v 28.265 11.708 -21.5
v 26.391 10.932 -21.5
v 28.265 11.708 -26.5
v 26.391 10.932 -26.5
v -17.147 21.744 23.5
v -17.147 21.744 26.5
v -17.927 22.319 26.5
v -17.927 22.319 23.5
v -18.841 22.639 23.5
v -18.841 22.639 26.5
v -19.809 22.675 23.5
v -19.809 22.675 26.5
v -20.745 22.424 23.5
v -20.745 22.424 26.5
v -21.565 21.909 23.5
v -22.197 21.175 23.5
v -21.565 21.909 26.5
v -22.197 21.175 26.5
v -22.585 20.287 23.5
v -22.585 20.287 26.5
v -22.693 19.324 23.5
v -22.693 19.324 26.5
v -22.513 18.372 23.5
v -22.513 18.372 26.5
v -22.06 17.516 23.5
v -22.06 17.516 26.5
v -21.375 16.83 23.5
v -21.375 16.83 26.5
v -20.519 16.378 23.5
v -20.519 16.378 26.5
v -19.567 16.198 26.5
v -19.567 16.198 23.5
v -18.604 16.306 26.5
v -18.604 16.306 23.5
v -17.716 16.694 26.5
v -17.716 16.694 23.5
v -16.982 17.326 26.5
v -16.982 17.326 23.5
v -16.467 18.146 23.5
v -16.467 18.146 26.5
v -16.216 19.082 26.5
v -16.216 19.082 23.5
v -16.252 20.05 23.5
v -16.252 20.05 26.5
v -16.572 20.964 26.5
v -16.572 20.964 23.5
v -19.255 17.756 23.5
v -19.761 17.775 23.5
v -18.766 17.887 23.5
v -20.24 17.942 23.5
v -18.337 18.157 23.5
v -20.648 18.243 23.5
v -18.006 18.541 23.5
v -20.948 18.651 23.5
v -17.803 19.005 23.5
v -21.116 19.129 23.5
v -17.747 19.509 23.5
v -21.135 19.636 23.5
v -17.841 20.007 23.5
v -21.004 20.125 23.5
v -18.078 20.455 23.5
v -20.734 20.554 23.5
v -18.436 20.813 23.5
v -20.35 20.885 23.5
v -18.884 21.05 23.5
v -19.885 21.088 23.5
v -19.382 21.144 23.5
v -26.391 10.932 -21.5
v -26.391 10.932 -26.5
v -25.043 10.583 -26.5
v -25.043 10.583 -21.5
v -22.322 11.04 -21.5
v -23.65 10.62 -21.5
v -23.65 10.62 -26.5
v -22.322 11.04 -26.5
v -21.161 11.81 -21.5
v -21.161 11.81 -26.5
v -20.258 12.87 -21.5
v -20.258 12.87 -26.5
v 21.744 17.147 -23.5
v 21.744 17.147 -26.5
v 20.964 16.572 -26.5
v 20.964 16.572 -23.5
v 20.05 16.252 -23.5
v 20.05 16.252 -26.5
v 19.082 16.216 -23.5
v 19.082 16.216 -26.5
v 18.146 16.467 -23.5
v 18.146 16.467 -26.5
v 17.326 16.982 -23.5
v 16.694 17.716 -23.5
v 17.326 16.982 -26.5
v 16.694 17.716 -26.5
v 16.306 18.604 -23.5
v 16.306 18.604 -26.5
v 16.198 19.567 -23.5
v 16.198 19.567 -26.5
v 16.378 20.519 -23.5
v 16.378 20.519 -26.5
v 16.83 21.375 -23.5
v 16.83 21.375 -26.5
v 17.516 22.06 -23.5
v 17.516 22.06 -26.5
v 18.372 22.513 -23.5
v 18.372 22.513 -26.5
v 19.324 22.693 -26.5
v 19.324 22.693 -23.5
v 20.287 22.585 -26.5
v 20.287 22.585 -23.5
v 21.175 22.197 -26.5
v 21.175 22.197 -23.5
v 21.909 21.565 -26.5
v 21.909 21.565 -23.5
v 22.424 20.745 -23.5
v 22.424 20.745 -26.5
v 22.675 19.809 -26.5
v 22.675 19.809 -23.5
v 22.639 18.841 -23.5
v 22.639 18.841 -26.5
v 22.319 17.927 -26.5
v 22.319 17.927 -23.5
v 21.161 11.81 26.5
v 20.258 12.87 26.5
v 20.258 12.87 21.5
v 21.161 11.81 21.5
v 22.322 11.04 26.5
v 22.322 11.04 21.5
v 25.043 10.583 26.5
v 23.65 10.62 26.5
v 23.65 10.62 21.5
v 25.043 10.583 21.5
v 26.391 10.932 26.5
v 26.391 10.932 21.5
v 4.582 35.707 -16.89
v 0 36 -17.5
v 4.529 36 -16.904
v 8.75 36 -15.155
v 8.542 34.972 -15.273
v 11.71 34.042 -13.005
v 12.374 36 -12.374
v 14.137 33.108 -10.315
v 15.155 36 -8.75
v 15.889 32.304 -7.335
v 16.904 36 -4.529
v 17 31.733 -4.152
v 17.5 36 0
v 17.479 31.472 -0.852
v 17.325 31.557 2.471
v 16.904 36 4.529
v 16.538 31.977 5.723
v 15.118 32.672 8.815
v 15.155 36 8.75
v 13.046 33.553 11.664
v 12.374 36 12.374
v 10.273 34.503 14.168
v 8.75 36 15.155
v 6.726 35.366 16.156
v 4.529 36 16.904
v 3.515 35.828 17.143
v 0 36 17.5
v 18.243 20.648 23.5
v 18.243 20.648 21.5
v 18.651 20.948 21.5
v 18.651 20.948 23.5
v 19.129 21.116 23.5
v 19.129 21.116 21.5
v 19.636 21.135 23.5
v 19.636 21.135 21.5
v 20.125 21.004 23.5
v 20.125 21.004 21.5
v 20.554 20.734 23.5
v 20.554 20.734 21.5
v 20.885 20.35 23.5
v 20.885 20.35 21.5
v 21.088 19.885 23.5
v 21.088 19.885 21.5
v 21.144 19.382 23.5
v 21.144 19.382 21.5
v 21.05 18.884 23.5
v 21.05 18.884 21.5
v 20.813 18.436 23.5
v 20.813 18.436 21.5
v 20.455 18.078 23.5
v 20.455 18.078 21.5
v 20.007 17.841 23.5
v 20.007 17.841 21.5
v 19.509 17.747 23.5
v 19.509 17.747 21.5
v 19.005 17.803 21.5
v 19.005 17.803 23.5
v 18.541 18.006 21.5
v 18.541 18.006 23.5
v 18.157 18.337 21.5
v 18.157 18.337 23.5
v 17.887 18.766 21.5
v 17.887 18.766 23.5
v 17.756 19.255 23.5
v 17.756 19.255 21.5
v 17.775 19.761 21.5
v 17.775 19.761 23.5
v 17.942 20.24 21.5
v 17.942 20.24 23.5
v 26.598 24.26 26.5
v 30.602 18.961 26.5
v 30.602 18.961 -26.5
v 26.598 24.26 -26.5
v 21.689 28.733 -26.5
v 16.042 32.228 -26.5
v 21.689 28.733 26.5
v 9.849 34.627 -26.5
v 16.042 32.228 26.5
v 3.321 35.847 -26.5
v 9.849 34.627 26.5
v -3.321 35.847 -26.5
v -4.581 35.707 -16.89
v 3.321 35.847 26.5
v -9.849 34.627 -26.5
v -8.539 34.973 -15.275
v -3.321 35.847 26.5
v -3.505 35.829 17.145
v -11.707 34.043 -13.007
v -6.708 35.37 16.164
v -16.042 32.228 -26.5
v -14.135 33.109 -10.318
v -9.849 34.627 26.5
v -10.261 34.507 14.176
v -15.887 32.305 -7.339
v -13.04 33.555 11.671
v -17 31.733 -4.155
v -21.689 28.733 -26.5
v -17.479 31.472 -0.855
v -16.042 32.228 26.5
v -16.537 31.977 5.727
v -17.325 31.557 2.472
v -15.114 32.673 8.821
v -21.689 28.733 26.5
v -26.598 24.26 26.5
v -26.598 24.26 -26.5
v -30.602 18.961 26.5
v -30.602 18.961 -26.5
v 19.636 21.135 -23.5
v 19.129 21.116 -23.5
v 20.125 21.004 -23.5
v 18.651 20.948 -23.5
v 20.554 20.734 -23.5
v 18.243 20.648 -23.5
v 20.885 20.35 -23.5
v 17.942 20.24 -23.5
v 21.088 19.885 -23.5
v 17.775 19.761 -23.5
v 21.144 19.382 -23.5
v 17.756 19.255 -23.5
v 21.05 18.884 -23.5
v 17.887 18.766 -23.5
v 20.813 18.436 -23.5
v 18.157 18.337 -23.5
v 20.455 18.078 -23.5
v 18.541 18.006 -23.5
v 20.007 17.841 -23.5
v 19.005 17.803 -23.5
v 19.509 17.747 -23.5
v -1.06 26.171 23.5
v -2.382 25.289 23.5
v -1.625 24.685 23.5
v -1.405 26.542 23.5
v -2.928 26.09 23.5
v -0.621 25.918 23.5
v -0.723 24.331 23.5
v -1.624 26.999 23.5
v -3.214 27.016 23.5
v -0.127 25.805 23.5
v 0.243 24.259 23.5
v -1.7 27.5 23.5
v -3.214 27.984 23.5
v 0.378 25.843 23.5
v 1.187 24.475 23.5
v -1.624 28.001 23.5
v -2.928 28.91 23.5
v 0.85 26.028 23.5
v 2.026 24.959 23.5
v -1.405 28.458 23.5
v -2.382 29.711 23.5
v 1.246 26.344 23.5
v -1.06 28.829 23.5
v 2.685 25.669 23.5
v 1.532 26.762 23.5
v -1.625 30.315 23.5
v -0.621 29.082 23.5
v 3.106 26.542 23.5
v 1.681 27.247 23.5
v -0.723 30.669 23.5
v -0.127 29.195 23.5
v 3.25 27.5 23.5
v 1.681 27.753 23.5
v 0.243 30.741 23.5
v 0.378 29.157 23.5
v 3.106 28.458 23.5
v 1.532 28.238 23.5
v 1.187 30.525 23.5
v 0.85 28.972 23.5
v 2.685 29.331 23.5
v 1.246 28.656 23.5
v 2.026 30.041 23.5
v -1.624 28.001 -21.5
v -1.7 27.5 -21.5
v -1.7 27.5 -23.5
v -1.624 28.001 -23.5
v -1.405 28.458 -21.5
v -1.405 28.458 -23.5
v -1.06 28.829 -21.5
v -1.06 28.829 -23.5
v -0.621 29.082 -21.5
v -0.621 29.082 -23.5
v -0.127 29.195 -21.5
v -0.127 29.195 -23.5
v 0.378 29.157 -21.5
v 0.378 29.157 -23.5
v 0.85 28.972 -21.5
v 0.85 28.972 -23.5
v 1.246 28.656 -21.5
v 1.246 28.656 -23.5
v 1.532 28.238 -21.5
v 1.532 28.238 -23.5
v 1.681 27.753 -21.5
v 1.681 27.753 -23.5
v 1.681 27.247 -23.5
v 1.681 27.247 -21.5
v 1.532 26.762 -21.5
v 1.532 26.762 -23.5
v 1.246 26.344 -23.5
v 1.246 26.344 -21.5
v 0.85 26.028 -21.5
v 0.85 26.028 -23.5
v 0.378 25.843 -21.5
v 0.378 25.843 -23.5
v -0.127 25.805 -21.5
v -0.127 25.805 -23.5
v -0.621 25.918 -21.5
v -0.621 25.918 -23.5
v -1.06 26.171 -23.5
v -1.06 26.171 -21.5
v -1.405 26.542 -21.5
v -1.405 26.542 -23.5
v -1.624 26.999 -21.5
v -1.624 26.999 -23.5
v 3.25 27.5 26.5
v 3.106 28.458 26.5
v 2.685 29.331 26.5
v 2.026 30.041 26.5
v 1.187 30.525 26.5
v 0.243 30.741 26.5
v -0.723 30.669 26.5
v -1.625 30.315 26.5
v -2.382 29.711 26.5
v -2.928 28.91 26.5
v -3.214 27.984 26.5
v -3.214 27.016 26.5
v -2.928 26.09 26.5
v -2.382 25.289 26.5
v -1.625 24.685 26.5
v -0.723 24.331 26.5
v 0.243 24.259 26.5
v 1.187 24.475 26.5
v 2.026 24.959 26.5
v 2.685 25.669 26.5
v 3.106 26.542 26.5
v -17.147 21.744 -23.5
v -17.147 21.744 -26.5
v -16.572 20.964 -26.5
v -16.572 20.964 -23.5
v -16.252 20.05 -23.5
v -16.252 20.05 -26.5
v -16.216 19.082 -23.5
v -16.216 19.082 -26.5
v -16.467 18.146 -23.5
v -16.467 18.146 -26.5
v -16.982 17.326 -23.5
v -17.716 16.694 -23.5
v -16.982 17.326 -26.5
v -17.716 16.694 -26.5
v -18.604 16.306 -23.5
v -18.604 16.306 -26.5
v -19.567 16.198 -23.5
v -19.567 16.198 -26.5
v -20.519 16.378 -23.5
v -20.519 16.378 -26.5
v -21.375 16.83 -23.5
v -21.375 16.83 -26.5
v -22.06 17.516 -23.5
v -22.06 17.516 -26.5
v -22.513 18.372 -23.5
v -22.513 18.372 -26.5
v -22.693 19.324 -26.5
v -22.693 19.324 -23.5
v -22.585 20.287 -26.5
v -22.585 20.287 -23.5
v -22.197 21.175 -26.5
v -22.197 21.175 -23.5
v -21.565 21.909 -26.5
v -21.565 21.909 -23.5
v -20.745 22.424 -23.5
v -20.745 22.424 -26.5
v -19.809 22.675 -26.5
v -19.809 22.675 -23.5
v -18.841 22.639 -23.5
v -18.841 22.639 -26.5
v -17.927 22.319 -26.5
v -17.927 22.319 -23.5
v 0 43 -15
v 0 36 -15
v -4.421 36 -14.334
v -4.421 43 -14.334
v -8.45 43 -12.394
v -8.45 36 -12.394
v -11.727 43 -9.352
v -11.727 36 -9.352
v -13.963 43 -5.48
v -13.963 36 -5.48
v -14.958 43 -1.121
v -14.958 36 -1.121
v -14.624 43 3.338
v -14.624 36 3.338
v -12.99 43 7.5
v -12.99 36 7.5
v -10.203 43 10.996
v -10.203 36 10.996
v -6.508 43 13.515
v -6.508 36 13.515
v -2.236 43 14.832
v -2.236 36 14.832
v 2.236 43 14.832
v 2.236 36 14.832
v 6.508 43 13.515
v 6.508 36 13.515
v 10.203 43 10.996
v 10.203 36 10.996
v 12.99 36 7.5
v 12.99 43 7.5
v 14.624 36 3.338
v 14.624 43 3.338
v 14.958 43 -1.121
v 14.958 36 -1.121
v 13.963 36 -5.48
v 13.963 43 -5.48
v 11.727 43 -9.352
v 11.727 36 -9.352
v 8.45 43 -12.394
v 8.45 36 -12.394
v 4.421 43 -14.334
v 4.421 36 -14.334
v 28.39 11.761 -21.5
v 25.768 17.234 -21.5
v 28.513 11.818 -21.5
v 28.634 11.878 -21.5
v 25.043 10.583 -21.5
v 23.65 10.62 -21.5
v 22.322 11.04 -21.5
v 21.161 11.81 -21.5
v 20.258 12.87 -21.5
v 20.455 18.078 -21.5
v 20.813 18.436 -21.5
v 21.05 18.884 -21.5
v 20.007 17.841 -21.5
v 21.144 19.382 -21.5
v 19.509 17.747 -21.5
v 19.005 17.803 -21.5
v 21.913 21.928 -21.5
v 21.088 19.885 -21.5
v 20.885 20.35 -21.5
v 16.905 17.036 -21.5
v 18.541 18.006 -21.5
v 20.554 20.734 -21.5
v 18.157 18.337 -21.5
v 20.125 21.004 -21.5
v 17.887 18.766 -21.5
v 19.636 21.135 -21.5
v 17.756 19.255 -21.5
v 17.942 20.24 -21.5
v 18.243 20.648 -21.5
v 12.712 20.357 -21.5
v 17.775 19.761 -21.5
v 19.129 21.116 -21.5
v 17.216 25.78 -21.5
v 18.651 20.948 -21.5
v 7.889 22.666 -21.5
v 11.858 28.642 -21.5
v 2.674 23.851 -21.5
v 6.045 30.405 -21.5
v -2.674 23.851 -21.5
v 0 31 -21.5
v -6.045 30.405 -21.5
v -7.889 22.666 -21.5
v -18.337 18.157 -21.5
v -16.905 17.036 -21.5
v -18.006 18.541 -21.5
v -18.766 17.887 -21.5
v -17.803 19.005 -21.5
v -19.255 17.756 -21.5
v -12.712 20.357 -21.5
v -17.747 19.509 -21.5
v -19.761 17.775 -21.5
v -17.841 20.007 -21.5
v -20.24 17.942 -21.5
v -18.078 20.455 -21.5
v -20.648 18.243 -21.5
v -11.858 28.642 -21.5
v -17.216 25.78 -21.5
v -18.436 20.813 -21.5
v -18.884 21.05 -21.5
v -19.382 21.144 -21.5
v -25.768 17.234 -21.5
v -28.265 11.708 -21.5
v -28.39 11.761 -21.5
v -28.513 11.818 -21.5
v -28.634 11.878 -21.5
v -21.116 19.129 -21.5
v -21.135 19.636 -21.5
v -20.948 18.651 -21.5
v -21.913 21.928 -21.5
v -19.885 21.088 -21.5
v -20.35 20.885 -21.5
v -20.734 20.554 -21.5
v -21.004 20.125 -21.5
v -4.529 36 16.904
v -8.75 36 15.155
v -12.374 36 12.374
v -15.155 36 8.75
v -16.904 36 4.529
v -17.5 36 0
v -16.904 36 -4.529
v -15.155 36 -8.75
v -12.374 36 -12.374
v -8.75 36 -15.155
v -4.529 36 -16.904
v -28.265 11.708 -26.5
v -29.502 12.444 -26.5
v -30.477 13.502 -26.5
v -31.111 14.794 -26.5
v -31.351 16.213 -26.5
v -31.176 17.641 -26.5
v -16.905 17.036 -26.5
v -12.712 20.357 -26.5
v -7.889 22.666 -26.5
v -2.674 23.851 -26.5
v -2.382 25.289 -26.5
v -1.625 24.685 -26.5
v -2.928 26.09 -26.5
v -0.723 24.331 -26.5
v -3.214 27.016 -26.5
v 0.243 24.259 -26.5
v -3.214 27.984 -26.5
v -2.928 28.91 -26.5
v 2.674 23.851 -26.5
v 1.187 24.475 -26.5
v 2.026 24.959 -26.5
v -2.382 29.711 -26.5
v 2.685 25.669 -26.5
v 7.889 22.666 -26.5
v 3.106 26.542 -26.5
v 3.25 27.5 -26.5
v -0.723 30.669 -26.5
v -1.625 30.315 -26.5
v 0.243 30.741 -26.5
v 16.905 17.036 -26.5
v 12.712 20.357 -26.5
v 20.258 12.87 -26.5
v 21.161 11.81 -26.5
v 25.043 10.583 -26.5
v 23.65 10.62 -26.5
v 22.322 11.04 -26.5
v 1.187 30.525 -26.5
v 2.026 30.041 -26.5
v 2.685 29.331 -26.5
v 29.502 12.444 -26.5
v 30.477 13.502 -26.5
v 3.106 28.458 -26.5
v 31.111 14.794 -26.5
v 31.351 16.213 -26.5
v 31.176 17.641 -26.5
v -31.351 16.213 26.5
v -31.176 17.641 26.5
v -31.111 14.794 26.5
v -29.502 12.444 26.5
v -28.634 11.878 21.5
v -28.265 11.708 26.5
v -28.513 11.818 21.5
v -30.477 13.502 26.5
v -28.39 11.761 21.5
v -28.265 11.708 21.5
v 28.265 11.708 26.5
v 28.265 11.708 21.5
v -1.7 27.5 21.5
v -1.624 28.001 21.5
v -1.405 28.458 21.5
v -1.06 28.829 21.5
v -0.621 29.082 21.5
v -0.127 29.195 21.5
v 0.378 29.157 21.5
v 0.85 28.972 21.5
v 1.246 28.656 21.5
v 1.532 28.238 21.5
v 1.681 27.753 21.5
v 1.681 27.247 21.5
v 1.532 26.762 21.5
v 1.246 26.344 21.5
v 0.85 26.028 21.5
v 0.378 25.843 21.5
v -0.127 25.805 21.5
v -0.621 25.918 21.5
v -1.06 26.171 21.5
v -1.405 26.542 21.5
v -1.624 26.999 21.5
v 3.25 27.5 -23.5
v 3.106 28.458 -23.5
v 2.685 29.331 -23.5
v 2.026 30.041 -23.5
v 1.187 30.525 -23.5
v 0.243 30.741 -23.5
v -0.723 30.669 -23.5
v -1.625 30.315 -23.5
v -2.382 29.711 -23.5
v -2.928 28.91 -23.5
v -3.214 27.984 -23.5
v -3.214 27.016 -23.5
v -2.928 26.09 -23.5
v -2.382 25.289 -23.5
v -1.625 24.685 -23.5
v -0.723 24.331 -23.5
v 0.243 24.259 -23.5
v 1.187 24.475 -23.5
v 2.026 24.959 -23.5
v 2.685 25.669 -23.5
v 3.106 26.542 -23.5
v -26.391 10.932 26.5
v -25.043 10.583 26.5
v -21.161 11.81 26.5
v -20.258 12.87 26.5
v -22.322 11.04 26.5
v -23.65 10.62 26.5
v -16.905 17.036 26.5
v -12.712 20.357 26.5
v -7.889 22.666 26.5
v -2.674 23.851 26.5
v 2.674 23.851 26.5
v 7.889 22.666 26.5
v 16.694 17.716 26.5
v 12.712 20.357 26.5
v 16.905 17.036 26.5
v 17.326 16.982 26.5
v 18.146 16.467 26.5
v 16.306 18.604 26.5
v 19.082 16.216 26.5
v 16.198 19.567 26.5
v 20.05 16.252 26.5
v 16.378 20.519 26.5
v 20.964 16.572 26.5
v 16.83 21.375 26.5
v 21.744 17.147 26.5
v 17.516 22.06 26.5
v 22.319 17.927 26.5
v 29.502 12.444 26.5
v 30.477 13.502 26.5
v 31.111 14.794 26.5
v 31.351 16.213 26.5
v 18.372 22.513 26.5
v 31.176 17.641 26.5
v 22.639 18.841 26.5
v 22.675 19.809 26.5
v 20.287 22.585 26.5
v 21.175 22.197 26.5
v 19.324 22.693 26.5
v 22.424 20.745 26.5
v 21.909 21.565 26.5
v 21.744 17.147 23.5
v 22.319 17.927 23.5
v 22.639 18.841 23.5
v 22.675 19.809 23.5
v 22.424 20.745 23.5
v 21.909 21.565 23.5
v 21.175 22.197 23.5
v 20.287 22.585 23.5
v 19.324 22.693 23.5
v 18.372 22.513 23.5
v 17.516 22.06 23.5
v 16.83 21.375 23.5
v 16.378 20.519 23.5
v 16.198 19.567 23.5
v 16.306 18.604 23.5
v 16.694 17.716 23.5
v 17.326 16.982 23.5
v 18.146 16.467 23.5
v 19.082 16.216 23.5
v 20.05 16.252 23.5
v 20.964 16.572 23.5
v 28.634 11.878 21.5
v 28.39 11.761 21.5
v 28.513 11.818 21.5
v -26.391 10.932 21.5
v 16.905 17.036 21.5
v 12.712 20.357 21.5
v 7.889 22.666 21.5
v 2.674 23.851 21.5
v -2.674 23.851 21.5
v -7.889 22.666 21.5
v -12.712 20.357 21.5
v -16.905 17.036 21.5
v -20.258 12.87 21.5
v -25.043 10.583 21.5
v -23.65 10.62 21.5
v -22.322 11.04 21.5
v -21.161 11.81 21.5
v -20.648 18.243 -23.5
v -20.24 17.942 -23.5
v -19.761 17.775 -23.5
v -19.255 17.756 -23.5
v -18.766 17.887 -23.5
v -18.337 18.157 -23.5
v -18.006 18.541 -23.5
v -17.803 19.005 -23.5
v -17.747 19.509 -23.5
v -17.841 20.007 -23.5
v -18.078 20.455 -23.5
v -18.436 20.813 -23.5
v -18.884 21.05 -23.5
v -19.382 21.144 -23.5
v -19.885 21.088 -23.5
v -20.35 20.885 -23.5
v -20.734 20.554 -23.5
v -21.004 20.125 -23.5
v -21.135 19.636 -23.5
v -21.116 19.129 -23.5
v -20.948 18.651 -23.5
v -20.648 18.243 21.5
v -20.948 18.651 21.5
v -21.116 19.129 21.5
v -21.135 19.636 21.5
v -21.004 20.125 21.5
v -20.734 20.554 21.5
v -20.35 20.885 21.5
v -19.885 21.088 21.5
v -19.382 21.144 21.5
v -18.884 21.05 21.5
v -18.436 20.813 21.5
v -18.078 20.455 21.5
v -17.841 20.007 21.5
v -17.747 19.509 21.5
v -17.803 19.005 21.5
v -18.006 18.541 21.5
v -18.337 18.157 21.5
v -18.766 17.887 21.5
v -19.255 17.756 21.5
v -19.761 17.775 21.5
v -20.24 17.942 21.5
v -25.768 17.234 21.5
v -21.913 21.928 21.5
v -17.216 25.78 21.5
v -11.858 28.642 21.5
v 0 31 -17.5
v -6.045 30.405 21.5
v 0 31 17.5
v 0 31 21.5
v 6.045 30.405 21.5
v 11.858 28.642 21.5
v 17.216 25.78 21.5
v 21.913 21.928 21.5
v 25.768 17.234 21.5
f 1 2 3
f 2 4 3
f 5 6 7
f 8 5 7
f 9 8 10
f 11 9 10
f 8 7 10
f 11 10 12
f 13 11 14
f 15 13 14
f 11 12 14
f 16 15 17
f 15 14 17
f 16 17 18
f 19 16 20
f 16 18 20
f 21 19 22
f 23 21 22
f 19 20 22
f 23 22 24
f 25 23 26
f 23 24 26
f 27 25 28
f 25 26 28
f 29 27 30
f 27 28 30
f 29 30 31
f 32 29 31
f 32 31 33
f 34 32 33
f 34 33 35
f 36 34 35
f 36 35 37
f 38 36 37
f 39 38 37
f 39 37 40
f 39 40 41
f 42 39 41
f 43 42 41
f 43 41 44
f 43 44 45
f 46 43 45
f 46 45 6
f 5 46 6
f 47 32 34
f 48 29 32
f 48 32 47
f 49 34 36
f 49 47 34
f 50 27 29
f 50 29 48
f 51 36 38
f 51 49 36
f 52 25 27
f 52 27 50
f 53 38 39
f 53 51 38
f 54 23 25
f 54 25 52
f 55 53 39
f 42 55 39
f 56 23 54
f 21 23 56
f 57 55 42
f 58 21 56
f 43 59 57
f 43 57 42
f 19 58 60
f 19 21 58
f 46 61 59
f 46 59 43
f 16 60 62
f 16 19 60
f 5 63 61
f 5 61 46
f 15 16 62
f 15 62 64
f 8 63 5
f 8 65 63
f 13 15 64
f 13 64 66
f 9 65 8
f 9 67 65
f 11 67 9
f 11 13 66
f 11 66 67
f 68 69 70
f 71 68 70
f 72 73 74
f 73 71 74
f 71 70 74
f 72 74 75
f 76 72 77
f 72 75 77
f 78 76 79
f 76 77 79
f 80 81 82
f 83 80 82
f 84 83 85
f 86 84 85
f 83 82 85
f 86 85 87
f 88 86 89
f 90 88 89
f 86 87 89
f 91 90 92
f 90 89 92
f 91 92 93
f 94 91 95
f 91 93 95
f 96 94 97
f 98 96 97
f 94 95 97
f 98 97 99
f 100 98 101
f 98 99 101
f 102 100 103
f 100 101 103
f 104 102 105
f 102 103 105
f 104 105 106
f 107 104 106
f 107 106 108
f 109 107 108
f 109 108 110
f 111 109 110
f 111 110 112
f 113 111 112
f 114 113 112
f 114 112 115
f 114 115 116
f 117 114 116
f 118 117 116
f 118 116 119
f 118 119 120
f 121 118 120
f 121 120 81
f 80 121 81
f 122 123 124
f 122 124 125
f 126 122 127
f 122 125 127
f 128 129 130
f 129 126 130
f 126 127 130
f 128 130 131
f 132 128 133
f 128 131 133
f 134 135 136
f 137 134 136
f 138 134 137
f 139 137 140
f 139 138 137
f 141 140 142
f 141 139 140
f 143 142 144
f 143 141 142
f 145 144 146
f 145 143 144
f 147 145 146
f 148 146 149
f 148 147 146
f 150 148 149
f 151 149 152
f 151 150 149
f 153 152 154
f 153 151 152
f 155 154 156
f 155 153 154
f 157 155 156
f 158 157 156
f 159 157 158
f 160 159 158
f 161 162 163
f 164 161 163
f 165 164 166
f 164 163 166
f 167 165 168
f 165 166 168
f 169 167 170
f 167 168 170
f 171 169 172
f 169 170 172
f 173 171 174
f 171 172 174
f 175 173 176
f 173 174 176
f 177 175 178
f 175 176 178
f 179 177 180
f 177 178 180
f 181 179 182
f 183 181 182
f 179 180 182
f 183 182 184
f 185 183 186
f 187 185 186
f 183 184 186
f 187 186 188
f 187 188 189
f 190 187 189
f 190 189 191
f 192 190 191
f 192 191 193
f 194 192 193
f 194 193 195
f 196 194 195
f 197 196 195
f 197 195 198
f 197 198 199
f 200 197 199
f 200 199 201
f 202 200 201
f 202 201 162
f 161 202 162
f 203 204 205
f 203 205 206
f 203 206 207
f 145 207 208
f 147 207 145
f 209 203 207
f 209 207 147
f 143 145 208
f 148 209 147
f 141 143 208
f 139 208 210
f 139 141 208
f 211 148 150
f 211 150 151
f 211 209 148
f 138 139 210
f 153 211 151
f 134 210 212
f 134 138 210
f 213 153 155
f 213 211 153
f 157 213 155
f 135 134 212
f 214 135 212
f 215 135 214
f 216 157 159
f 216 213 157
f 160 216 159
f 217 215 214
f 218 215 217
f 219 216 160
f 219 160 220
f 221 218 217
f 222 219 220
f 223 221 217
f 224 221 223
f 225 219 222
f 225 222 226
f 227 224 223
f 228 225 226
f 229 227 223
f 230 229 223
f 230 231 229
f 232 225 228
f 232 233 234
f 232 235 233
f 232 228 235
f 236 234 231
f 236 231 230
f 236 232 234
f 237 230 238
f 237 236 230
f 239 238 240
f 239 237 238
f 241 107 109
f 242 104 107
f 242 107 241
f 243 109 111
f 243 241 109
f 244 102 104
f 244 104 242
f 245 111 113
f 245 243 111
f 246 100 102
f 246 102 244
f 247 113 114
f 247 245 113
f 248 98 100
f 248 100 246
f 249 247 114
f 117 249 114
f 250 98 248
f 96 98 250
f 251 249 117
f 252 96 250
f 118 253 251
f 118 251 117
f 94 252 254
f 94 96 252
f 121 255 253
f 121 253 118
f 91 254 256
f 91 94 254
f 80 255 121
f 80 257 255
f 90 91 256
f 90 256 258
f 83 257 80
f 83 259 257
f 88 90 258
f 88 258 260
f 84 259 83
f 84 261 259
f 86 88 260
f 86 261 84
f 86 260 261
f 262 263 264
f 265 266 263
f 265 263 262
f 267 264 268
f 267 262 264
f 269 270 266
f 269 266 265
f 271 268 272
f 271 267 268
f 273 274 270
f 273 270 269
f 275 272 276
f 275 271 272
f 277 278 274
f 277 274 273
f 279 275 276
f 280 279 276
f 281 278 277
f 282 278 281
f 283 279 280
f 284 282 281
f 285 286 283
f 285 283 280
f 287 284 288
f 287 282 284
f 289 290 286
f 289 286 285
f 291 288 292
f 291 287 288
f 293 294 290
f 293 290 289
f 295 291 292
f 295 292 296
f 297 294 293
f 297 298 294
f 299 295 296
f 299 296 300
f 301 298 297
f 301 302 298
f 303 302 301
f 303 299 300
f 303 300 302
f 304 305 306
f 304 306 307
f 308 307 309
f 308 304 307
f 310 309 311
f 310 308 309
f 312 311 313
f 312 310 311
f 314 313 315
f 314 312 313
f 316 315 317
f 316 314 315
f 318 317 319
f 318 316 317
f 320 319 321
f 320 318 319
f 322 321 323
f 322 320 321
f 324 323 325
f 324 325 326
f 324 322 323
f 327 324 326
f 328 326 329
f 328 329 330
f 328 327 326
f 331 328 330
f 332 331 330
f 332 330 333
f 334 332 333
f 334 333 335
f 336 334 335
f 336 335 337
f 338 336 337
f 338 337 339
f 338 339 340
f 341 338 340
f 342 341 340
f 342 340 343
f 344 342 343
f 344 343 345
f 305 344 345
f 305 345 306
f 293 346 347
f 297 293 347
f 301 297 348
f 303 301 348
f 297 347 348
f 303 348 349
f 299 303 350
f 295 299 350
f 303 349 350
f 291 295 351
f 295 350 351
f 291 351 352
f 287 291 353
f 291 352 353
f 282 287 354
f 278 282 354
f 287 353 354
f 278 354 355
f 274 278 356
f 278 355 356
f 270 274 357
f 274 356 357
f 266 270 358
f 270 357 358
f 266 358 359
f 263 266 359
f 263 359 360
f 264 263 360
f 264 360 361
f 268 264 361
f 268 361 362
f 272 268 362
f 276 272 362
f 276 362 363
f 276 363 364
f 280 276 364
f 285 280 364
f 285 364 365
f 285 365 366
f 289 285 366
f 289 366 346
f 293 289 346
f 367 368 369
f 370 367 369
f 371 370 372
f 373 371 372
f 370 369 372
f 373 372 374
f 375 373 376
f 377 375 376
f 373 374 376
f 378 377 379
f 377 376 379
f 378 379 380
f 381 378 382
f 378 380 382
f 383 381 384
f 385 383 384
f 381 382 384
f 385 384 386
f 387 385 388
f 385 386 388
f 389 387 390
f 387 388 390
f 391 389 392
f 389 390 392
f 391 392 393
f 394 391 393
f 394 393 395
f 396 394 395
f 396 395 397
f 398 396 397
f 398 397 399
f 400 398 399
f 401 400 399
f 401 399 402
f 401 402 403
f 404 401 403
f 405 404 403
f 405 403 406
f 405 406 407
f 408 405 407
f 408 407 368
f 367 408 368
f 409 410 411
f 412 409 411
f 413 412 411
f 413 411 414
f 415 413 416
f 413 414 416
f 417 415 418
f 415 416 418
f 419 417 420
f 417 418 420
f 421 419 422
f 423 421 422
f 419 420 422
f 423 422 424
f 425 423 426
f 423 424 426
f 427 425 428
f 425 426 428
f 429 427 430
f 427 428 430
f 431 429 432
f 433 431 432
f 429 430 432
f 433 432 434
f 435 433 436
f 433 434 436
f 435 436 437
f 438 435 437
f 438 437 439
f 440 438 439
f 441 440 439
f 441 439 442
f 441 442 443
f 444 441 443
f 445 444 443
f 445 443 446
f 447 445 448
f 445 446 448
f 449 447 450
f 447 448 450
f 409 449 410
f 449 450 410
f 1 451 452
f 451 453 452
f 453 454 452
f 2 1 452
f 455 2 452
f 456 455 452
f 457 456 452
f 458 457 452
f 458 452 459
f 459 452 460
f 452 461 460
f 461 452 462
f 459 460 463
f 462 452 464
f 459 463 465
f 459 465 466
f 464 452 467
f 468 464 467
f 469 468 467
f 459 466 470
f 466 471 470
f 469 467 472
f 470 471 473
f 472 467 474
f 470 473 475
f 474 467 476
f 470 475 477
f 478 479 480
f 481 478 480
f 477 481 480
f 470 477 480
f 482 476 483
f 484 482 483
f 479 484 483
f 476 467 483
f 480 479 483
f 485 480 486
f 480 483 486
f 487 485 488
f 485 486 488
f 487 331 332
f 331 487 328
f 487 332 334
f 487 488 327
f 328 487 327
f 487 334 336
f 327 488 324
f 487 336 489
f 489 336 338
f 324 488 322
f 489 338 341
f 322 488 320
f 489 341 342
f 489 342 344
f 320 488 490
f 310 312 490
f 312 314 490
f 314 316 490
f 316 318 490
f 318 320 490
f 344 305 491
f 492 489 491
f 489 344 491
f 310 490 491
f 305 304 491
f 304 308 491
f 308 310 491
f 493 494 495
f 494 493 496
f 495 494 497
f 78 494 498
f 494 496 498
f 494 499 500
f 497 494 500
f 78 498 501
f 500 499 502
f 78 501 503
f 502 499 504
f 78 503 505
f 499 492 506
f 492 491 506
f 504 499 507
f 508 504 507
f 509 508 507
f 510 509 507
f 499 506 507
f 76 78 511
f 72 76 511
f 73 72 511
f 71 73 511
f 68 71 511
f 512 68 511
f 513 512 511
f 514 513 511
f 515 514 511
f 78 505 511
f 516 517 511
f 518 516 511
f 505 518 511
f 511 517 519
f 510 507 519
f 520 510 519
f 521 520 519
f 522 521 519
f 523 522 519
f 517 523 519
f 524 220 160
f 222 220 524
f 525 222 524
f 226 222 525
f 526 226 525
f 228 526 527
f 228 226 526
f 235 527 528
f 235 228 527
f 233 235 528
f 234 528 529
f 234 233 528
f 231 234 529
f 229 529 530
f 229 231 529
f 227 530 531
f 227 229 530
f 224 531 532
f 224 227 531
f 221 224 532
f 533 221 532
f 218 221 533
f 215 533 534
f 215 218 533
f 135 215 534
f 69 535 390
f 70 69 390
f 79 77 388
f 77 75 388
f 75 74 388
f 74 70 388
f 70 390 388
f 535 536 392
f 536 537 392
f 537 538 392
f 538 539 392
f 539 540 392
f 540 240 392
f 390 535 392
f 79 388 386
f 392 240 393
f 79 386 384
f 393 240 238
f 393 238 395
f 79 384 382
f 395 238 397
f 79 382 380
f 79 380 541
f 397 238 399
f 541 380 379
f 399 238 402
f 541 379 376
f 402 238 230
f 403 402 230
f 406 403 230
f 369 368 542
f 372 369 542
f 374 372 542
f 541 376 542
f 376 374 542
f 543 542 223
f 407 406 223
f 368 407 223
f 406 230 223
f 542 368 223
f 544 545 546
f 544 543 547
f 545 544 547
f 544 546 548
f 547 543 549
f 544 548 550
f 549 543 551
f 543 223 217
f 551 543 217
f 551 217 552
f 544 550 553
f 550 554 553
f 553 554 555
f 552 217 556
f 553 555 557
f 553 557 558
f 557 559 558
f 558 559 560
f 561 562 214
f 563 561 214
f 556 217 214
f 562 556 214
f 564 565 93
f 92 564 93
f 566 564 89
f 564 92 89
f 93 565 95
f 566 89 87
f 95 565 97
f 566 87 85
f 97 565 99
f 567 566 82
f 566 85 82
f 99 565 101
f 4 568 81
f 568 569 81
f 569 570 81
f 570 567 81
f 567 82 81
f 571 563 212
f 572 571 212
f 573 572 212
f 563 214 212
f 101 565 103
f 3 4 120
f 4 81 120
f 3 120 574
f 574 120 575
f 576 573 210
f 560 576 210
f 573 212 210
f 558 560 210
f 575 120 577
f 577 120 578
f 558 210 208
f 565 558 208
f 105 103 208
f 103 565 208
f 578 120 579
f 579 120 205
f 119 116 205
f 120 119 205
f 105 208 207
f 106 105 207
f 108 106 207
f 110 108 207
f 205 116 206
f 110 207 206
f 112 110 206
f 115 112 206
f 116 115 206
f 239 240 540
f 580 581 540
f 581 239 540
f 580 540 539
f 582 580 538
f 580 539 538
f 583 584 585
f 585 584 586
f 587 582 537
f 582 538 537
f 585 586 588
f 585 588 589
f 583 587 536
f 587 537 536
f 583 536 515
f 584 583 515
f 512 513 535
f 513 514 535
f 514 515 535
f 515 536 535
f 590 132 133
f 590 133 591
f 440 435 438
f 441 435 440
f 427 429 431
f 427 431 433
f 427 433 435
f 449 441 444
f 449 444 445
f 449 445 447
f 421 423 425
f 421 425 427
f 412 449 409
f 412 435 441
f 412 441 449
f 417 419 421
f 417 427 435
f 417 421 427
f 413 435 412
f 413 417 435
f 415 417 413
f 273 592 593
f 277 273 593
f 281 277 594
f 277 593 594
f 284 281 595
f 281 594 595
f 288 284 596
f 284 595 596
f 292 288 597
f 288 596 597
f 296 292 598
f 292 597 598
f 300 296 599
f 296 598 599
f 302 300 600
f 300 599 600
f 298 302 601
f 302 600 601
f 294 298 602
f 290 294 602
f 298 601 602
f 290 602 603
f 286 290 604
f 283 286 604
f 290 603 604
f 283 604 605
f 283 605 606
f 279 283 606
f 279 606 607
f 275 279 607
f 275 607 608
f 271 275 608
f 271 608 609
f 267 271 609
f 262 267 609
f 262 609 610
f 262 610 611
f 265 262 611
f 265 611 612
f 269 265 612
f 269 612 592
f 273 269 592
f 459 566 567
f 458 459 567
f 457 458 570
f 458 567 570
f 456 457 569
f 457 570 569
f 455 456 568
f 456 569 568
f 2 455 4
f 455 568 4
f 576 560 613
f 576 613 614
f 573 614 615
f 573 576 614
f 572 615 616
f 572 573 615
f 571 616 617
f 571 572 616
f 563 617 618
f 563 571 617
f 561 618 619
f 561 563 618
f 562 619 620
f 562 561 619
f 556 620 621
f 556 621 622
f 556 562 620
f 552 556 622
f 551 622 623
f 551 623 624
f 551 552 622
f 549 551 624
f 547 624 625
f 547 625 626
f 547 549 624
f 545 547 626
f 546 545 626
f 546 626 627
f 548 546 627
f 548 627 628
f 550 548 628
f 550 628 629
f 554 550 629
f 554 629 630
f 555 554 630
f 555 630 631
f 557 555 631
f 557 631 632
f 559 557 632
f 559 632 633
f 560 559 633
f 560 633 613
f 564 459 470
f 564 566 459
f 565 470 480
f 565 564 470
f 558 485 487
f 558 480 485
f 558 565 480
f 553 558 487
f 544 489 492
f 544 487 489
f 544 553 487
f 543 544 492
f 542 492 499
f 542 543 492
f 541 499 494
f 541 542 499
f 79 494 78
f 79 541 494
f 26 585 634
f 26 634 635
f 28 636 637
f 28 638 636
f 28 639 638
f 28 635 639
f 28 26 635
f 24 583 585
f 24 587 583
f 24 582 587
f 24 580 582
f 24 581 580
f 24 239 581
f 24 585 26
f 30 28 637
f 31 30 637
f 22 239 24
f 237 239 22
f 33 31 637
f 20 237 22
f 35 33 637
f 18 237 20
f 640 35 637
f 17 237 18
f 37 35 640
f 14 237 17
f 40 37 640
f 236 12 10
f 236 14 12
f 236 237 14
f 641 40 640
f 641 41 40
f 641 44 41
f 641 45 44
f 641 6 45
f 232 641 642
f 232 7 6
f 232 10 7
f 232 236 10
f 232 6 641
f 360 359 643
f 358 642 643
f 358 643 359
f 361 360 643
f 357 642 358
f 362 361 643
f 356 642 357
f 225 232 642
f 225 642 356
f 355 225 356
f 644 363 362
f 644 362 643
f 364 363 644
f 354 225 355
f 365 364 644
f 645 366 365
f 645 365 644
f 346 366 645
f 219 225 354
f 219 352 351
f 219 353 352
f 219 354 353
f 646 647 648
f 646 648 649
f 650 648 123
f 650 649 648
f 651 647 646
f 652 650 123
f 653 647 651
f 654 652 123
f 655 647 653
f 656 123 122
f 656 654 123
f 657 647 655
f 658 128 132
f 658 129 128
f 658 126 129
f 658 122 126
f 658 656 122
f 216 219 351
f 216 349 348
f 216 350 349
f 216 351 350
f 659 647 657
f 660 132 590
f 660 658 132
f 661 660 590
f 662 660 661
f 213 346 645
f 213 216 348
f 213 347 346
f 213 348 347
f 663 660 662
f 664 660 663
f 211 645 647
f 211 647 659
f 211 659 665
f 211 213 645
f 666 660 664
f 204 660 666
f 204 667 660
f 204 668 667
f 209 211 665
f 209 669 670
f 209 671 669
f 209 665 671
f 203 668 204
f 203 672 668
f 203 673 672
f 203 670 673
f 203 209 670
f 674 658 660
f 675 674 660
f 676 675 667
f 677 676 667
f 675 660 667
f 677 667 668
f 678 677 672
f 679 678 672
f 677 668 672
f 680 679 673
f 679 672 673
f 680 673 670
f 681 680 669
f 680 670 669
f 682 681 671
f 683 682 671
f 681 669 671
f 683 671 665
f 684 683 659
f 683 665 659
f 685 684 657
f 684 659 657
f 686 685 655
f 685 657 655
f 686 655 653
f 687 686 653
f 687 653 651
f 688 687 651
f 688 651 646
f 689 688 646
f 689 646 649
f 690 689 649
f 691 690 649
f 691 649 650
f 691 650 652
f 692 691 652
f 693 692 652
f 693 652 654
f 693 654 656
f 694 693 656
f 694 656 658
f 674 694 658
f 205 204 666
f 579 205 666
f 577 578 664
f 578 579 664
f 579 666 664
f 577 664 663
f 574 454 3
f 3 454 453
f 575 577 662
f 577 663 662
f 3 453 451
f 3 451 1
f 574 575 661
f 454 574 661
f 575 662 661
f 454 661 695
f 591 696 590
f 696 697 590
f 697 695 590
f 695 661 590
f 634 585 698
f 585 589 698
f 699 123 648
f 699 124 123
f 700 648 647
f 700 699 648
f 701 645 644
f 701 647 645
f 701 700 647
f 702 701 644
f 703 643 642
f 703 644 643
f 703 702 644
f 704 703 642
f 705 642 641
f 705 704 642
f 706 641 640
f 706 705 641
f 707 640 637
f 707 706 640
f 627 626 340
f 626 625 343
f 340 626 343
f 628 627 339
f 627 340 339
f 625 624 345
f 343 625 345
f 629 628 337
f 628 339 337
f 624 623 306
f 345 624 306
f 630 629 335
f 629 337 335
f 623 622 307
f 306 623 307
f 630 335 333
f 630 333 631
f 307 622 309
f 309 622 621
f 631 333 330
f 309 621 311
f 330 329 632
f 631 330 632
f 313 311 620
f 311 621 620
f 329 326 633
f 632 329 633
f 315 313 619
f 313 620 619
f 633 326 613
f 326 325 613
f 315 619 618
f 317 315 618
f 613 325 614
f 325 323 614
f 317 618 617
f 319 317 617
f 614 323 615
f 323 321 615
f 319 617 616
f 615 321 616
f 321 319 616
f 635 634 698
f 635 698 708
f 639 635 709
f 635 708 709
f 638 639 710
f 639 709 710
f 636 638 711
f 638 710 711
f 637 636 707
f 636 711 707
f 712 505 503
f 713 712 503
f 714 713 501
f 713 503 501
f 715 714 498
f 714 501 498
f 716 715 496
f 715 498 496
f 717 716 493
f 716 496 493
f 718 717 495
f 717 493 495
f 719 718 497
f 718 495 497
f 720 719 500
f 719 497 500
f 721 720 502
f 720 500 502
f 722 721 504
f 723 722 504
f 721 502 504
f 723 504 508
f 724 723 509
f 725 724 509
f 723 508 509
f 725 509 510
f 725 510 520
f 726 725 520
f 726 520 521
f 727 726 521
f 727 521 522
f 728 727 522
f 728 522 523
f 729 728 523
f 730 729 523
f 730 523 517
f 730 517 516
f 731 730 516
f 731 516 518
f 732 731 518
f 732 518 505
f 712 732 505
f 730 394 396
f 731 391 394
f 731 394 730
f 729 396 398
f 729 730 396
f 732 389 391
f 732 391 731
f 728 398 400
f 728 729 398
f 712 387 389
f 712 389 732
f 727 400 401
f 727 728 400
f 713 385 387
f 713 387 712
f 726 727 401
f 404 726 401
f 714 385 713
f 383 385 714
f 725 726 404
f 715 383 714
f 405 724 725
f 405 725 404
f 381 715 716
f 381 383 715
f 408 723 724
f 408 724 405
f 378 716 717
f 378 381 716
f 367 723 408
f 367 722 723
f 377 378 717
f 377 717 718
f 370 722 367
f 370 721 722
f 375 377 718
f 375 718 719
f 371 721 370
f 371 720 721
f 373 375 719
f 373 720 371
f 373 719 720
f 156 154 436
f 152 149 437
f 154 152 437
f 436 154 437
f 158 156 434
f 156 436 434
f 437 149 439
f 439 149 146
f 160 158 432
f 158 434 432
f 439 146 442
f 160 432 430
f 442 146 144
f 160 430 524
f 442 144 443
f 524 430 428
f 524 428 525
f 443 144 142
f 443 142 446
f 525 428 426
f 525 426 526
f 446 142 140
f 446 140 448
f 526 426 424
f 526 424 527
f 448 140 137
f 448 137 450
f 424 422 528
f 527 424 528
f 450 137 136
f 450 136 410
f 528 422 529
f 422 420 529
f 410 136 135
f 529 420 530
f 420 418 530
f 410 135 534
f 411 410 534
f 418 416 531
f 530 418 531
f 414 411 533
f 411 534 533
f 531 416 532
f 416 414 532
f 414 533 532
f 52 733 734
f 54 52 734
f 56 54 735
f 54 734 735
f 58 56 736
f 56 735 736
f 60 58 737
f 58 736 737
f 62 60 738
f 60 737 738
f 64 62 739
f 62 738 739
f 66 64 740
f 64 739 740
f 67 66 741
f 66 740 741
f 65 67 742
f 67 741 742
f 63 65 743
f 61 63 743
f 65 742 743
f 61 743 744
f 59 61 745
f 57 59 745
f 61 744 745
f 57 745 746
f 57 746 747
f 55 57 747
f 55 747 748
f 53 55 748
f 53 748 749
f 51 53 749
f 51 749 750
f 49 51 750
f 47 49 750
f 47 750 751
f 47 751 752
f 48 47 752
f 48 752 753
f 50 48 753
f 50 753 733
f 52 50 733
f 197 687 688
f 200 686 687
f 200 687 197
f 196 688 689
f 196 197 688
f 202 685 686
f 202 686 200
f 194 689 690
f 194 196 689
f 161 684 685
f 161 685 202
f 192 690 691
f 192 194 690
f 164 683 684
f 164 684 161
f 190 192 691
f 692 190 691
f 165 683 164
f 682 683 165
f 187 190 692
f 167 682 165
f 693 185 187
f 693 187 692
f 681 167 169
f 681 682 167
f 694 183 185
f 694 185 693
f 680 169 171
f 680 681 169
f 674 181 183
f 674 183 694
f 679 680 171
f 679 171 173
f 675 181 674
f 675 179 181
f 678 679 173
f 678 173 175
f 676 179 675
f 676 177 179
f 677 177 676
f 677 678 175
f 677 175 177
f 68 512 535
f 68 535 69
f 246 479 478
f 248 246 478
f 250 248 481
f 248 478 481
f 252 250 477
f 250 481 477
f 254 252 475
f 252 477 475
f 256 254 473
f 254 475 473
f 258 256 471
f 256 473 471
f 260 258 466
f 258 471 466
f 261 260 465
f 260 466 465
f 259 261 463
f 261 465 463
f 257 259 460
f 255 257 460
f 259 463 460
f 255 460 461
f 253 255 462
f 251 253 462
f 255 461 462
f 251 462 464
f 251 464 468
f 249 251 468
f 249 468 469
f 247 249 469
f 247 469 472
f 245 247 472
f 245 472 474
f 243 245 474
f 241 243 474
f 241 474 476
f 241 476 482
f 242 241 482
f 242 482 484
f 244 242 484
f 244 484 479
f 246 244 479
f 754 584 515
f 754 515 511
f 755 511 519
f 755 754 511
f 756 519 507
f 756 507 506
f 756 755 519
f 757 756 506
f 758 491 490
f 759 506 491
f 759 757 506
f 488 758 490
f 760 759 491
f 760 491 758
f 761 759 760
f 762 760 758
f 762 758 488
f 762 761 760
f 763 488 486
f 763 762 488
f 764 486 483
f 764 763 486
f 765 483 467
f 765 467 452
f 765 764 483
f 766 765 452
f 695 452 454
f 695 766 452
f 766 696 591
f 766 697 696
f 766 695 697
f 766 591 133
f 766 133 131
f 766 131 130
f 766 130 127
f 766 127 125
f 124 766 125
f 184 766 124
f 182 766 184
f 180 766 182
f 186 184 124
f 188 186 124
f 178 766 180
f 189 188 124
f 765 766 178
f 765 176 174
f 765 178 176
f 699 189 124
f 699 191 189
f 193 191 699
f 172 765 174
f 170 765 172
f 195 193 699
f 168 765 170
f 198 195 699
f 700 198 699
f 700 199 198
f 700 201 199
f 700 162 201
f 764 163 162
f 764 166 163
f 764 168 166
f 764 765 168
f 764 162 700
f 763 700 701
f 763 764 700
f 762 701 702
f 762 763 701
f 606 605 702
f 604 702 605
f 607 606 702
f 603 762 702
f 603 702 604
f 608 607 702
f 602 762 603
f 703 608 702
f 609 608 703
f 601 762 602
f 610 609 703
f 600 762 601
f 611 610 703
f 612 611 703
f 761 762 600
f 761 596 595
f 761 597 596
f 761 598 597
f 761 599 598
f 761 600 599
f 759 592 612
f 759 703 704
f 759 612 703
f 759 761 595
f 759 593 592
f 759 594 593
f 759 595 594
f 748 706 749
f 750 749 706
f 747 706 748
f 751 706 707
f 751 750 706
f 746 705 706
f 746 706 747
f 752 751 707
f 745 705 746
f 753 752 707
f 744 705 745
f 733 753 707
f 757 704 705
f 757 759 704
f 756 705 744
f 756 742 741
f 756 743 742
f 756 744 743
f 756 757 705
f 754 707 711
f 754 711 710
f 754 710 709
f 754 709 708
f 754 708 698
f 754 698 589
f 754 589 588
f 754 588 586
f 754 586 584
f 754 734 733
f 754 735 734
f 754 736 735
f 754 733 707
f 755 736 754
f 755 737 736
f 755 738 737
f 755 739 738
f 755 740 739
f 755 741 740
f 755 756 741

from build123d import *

# Parameters (mm, degrees)
SKETCH_1_R                   = 36
EXTRUDE_1_DEPTH              = 26.5
CUT_EXTRUDE_3_DEPTH          = 58.395557319
CUT_EXTRUDE_3_DEPTH_BACK     = 58.395557319
SKETCH_5_R                   = 24
CUT_EXTRUDE_4_DEPTH          = 74.491496107
CUT_EXTRUDE_4_DEPTH_BACK     = 74.491496107
CUT_EXTRUDE_2_DEPTH          = 21.5
HOLE_WIZARD_M3_1_D           = 3.4
HOLE_WIZARD_M3_1_DEPTH       = 5
HOLE_WIZARD_M3_1_CBORE_D     = 6.5
HOLE_WIZARD_M3_1_CBORE_DEPTH = 3
PATTERN_CIRCULAR_1_COUNT     = 2
PATTERN_CIRCULAR_1_ANGLE     = 45
F_1_THE_OTHER_WAY_COUNT      = 2
F_1_THE_OTHER_WAY_ANGLE      = 45
MIRROR_1_COPY_1_D            = 3.4
MIRROR_1_COPY_1_DEPTH        = 5
MIRROR_1_COPY_1_CBORE_D      = 6.5
MIRROR_1_COPY_1_CBORE_DEPTH  = 3
MIRROR_1_COPY_2_D            = 3.4
MIRROR_1_COPY_2_DEPTH        = 5
MIRROR_1_COPY_2_CBORE_D      = 6.5
MIRROR_1_COPY_2_CBORE_DEPTH  = 3
FILLET_1_R                   = 5
SKETCH_10_R                  = 17.5
EXTRUDE_2_DEPTH              = 5
SKETCH_17_R                  = 15
EXTRUDE_3_DEPTH              = 7


with BuildPart() as part:
    # ｽｹｯﾁ1 → ﾎﾞｽ - 押し出し1 (new, symmetric)
    with BuildSketch(Plane.XY):
        Circle(SKETCH_1_R)
    extrude(amount=EXTRUDE_1_DEPTH, both=True)

    # ｽｹｯﾁ5 → ｶｯﾄ - 押し出し3 (cut, two sides: drawn at the far end of the back side and taken through both)
    with BuildSketch(Plane.XY.offset(-CUT_EXTRUDE_3_DEPTH_BACK)):
        Circle(SKETCH_5_R)
    extrude(amount=CUT_EXTRUDE_3_DEPTH + CUT_EXTRUDE_3_DEPTH_BACK, mode=Mode.SUBTRACT)

    # ｽｹｯﾁ6 → ｶｯﾄ - 押し出し4 (cut, two sides: drawn at the far end of the back side and taken through both)
    with BuildSketch(Plane.XY.offset(26.5).offset(-CUT_EXTRUDE_4_DEPTH_BACK)):
        with BuildLine():
            Line((-33.25966317, 13.776603565), (0, 0))
            Line((0, 0), (33.25966317, 13.776603565))
            ThreePointArc((33.25966317, 13.776603565), (0, -36), (-33.25966317, 13.776603565))
        make_face()
    extrude(amount=CUT_EXTRUDE_4_DEPTH + CUT_EXTRUDE_4_DEPTH_BACK, mode=Mode.SUBTRACT)

    # ｽｹｯﾁ3 → ｶｯﾄ - 押し出し2 (cut, symmetric)
    with BuildSketch(Plane.XY):
        with BuildLine():
            Line((-33.25966317, 13.776603565), (-28.640265508, 11.863186403))
            ThreePointArc((-28.640265508, 11.863186403), (0, 31), (28.640265508, 11.863186403))
            Line((28.640265508, 11.863186403), (33.25966317, 13.776603565))
            ThreePointArc((33.25966317, 13.776603565), (0, -36), (-33.25966317, 13.776603565))
        make_face()
    extrude(amount=CUT_EXTRUDE_2_DEPTH, both=True, mode=Mode.SUBTRACT)

    # M3 穴付きねじ用座ぐり穴1
    with Locations(Plane.XY.offset(26.5)):
        with Locations((0, 27.5)):
            hole_wizard_m3_1 = CounterBoreHole(HOLE_WIZARD_M3_1_D / 2, HOLE_WIZARD_M3_1_CBORE_D / 2, HOLE_WIZARD_M3_1_CBORE_DEPTH, depth=HOLE_WIZARD_M3_1_DEPTH)

    # 円形ﾊﾟﾀｰﾝ1: M3 穴付きねじ用座ぐり穴1 ×2 about axis
    pattern_circular_1_axis = Axis((0, 0, 26.5), (0, 0, -1))
    for i in range(1, PATTERN_CIRCULAR_1_COUNT):
        add(hole_wizard_m3_1.rotate(pattern_circular_1_axis, i * PATTERN_CIRCULAR_1_ANGLE / (PATTERN_CIRCULAR_1_COUNT - 1)), mode=Mode.SUBTRACT)

    # 1 the other way: M3 穴付きねじ用座ぐり穴1 ×2 about axis
    f_1_the_other_way_axis = Axis((0, 0, 26.5), (0, 0, 1))
    for i in range(1, F_1_THE_OTHER_WAY_COUNT):
        add(hole_wizard_m3_1.rotate(f_1_the_other_way_axis, i * F_1_THE_OTHER_WAY_ANGLE / (F_1_THE_OTHER_WAY_COUNT - 1)), mode=Mode.SUBTRACT)

    # ﾐﾗｰ1: M3 穴付きねじ用座ぐり穴1 across plane
    add(hole_wizard_m3_1.mirror(Plane.XY), mode=Mode.SUBTRACT)

    # ﾐﾗｰ1 copy 1
    with Locations(Plane(origin=(0, 0, -26.5), x_dir=(0.7071067811865462, -0.7071067811865488, 0), z_dir=(0, 0, -1))):
        with Locations((0, -27.5)):
            CounterBoreHole(MIRROR_1_COPY_1_D / 2, MIRROR_1_COPY_1_CBORE_D / 2, MIRROR_1_COPY_1_CBORE_DEPTH, depth=MIRROR_1_COPY_1_DEPTH)

    # ﾐﾗｰ1 copy 2
    with Locations(Plane(origin=(0, 0, -26.5), x_dir=(0.7071067811865462, 0.7071067811865488, 0), z_dir=(0, 0, -1))):
        with Locations((0, -27.5)):
            CounterBoreHole(MIRROR_1_COPY_2_D / 2, MIRROR_1_COPY_2_CBORE_D / 2, MIRROR_1_COPY_2_CBORE_DEPTH, depth=MIRROR_1_COPY_2_DEPTH)

    # ﾌｨﾚｯﾄ1
    # the kernel refuses this fillet: 5 mm, written as the material it takes off along each edge
    with BuildSketch(Plane(origin=(33.25966317, 13.776603565, 41.063878514), x_dir=(-0.4561802532309845, 0.88988739543951, 0), z_dir=(0, 0, -1)), Plane(origin=(-33.25966317, 13.776603565, -41.063878514), x_dir=(0.45618025323098454, 0.88988739543951, 0), z_dir=(0, 0, 1))) as fillet_1_piece_1:
        with BuildLine():
            CenterArc((5.420999225, -4.98360688), FILLET_1_R, 85.359100457, 99.281799087)
            Line((0.437392345, -5.388159061), (0, 0))
            ThreePointArc((0, 0), (2.912775703, 0.118030465), (5.825551406, 0))
        make_face()
    extrude(amount=82.127757029, mode=Mode.SUBTRACT)
    with BuildSketch(Plane(origin=(22.17310878, 9.184402377, -37.914284285), x_dir=(0.9238795325112864, 0.38268343236509056, 0), z_dir=(0, 0, 1)), Plane(origin=(22.17310878, 9.184402377, 10.085715715), x_dir=(0.9238795325112864, 0.38268343236509056, 0), z_dir=(0, 0, 1))) as fillet_1_piece_2:
        with BuildLine():
            CenterArc((4.565713714, 5), FILLET_1_R, 189.928191842, 80.071808158)
            ThreePointArc((-0.35940934, 4.137931034), (-0.090021164, 2.076755181), (0, 0))
            Line((0, 0), (4.565713714, 0))
        make_face()
    extrude(amount=27.828568571, mode=Mode.SUBTRACT)
    with BuildSketch(Plane(origin=(-22.17310878, 9.184402377, -37.914284285), x_dir=(-0.9238795325112864, 0.38268343236509056, 0), z_dir=(0, 0, 1)), Plane(origin=(-22.17310878, 9.184402377, 10.085715715), x_dir=(-0.9238795325112864, 0.38268343236509056, 0), z_dir=(0, 0, 1))) as fillet_1_piece_3:
        with BuildLine():
            CenterArc((4.565713714, -5), FILLET_1_R, 90, 80.071808158)
            ThreePointArc((-0.35940934, -4.137931034), (-0.090021164, -2.076755181), (0, 0))
            Line((0, 0), (4.565713714, 0))
        make_face()
    extrude(amount=27.828568571, mode=Mode.SUBTRACT)

    # ｽｹｯﾁ10 → ﾎﾞｽ - 押し出し2 (add, through all)
    with BuildSketch(Plane(origin=(0, 31, 0), x_dir=(-1, 0, 0), z_dir=(0, -1, 0))):
        Circle(SKETCH_10_R)
    extrude(amount=-EXTRUDE_2_DEPTH)

    # ｽｹｯﾁ17 → ﾎﾞｽ - 押し出し3 (add)
    with BuildSketch(Plane(origin=(0, 36, 0), x_dir=(1, 0, 0), z_dir=(0, 1, 0))):
        with Locations(Location((0, 0, 0), (0, 0, 90))):
            Circle(SKETCH_17_R)
    extrude(amount=EXTRUDE_3_DEPTH)


solid = part.part
